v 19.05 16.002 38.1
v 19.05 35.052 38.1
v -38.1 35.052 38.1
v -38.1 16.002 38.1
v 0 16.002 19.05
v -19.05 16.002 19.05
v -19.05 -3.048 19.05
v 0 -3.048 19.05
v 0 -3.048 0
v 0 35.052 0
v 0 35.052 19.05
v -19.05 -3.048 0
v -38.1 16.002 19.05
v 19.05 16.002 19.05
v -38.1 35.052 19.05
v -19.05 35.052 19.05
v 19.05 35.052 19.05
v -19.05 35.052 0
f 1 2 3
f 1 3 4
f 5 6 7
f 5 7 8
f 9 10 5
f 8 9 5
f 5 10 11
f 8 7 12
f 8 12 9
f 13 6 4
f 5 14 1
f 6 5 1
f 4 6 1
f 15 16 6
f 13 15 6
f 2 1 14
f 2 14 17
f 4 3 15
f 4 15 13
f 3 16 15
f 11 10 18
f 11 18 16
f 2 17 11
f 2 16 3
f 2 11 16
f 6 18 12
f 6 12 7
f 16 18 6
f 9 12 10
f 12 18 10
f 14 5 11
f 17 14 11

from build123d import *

# Parameters (mm, degrees)
F0_W      = 19.05
F0_H      = 19.05
F1_DEPTH  = 19.05
F1_FACE_W = 19.05
F1_FACE_H = 19.05
F2_DEPTH  = 19.05
F3_W      = 19.05
F3_H      = 19.05
F4_DEPTH  = 19.05
F5_W      = 19.05
F5_H      = 19.05
F6_DEPTH  = 19.05
F7_W      = 19.05
F7_H      = 19.05
F8_DEPTH  = 19.05


with BuildPart() as f1:
    # F0 (on Top) → F1 (new body)
    with BuildSketch(Plane.XY):
        with Locations((-9.525, 25.527001)):
            Rectangle(F0_W, F0_H)
    extrude(amount=F1_DEPTH)

    # F1_face (on face) → F2 (join)
    with BuildSketch(Plane(origin=(-9.525, 25.527001, 19.05), x_dir=(1, 0, 0), z_dir=(0, 0, 1))):
        Rectangle(F1_FACE_W, F1_FACE_H)
    extrude(amount=F2_DEPTH)

    # F3 (on face) → F4 (join)
    with BuildSketch(Plane.XZ.offset(-16.002001)):
        with Locations((-9.525, 9.525)):
            Rectangle(F3_W, F3_H)
    extrude(amount=F4_DEPTH)

    # F5 (on face) → F6 (join)
    with BuildSketch(Plane.YZ):
        with Locations((25.527001, 28.575)):
            Rectangle(F5_W, F5_H)
    extrude(amount=F6_DEPTH)

    # F7 (on face) → F8 (join)
    with BuildSketch(Plane(origin=(-19.05, 0, 0), x_dir=(0, -1, 0), z_dir=(-1, 0, 0))):
        with Locations((-25.527001, 28.575)):
            Rectangle(F7_W, F7_H)
    extrude(amount=F8_DEPTH)


solid = f1.part
